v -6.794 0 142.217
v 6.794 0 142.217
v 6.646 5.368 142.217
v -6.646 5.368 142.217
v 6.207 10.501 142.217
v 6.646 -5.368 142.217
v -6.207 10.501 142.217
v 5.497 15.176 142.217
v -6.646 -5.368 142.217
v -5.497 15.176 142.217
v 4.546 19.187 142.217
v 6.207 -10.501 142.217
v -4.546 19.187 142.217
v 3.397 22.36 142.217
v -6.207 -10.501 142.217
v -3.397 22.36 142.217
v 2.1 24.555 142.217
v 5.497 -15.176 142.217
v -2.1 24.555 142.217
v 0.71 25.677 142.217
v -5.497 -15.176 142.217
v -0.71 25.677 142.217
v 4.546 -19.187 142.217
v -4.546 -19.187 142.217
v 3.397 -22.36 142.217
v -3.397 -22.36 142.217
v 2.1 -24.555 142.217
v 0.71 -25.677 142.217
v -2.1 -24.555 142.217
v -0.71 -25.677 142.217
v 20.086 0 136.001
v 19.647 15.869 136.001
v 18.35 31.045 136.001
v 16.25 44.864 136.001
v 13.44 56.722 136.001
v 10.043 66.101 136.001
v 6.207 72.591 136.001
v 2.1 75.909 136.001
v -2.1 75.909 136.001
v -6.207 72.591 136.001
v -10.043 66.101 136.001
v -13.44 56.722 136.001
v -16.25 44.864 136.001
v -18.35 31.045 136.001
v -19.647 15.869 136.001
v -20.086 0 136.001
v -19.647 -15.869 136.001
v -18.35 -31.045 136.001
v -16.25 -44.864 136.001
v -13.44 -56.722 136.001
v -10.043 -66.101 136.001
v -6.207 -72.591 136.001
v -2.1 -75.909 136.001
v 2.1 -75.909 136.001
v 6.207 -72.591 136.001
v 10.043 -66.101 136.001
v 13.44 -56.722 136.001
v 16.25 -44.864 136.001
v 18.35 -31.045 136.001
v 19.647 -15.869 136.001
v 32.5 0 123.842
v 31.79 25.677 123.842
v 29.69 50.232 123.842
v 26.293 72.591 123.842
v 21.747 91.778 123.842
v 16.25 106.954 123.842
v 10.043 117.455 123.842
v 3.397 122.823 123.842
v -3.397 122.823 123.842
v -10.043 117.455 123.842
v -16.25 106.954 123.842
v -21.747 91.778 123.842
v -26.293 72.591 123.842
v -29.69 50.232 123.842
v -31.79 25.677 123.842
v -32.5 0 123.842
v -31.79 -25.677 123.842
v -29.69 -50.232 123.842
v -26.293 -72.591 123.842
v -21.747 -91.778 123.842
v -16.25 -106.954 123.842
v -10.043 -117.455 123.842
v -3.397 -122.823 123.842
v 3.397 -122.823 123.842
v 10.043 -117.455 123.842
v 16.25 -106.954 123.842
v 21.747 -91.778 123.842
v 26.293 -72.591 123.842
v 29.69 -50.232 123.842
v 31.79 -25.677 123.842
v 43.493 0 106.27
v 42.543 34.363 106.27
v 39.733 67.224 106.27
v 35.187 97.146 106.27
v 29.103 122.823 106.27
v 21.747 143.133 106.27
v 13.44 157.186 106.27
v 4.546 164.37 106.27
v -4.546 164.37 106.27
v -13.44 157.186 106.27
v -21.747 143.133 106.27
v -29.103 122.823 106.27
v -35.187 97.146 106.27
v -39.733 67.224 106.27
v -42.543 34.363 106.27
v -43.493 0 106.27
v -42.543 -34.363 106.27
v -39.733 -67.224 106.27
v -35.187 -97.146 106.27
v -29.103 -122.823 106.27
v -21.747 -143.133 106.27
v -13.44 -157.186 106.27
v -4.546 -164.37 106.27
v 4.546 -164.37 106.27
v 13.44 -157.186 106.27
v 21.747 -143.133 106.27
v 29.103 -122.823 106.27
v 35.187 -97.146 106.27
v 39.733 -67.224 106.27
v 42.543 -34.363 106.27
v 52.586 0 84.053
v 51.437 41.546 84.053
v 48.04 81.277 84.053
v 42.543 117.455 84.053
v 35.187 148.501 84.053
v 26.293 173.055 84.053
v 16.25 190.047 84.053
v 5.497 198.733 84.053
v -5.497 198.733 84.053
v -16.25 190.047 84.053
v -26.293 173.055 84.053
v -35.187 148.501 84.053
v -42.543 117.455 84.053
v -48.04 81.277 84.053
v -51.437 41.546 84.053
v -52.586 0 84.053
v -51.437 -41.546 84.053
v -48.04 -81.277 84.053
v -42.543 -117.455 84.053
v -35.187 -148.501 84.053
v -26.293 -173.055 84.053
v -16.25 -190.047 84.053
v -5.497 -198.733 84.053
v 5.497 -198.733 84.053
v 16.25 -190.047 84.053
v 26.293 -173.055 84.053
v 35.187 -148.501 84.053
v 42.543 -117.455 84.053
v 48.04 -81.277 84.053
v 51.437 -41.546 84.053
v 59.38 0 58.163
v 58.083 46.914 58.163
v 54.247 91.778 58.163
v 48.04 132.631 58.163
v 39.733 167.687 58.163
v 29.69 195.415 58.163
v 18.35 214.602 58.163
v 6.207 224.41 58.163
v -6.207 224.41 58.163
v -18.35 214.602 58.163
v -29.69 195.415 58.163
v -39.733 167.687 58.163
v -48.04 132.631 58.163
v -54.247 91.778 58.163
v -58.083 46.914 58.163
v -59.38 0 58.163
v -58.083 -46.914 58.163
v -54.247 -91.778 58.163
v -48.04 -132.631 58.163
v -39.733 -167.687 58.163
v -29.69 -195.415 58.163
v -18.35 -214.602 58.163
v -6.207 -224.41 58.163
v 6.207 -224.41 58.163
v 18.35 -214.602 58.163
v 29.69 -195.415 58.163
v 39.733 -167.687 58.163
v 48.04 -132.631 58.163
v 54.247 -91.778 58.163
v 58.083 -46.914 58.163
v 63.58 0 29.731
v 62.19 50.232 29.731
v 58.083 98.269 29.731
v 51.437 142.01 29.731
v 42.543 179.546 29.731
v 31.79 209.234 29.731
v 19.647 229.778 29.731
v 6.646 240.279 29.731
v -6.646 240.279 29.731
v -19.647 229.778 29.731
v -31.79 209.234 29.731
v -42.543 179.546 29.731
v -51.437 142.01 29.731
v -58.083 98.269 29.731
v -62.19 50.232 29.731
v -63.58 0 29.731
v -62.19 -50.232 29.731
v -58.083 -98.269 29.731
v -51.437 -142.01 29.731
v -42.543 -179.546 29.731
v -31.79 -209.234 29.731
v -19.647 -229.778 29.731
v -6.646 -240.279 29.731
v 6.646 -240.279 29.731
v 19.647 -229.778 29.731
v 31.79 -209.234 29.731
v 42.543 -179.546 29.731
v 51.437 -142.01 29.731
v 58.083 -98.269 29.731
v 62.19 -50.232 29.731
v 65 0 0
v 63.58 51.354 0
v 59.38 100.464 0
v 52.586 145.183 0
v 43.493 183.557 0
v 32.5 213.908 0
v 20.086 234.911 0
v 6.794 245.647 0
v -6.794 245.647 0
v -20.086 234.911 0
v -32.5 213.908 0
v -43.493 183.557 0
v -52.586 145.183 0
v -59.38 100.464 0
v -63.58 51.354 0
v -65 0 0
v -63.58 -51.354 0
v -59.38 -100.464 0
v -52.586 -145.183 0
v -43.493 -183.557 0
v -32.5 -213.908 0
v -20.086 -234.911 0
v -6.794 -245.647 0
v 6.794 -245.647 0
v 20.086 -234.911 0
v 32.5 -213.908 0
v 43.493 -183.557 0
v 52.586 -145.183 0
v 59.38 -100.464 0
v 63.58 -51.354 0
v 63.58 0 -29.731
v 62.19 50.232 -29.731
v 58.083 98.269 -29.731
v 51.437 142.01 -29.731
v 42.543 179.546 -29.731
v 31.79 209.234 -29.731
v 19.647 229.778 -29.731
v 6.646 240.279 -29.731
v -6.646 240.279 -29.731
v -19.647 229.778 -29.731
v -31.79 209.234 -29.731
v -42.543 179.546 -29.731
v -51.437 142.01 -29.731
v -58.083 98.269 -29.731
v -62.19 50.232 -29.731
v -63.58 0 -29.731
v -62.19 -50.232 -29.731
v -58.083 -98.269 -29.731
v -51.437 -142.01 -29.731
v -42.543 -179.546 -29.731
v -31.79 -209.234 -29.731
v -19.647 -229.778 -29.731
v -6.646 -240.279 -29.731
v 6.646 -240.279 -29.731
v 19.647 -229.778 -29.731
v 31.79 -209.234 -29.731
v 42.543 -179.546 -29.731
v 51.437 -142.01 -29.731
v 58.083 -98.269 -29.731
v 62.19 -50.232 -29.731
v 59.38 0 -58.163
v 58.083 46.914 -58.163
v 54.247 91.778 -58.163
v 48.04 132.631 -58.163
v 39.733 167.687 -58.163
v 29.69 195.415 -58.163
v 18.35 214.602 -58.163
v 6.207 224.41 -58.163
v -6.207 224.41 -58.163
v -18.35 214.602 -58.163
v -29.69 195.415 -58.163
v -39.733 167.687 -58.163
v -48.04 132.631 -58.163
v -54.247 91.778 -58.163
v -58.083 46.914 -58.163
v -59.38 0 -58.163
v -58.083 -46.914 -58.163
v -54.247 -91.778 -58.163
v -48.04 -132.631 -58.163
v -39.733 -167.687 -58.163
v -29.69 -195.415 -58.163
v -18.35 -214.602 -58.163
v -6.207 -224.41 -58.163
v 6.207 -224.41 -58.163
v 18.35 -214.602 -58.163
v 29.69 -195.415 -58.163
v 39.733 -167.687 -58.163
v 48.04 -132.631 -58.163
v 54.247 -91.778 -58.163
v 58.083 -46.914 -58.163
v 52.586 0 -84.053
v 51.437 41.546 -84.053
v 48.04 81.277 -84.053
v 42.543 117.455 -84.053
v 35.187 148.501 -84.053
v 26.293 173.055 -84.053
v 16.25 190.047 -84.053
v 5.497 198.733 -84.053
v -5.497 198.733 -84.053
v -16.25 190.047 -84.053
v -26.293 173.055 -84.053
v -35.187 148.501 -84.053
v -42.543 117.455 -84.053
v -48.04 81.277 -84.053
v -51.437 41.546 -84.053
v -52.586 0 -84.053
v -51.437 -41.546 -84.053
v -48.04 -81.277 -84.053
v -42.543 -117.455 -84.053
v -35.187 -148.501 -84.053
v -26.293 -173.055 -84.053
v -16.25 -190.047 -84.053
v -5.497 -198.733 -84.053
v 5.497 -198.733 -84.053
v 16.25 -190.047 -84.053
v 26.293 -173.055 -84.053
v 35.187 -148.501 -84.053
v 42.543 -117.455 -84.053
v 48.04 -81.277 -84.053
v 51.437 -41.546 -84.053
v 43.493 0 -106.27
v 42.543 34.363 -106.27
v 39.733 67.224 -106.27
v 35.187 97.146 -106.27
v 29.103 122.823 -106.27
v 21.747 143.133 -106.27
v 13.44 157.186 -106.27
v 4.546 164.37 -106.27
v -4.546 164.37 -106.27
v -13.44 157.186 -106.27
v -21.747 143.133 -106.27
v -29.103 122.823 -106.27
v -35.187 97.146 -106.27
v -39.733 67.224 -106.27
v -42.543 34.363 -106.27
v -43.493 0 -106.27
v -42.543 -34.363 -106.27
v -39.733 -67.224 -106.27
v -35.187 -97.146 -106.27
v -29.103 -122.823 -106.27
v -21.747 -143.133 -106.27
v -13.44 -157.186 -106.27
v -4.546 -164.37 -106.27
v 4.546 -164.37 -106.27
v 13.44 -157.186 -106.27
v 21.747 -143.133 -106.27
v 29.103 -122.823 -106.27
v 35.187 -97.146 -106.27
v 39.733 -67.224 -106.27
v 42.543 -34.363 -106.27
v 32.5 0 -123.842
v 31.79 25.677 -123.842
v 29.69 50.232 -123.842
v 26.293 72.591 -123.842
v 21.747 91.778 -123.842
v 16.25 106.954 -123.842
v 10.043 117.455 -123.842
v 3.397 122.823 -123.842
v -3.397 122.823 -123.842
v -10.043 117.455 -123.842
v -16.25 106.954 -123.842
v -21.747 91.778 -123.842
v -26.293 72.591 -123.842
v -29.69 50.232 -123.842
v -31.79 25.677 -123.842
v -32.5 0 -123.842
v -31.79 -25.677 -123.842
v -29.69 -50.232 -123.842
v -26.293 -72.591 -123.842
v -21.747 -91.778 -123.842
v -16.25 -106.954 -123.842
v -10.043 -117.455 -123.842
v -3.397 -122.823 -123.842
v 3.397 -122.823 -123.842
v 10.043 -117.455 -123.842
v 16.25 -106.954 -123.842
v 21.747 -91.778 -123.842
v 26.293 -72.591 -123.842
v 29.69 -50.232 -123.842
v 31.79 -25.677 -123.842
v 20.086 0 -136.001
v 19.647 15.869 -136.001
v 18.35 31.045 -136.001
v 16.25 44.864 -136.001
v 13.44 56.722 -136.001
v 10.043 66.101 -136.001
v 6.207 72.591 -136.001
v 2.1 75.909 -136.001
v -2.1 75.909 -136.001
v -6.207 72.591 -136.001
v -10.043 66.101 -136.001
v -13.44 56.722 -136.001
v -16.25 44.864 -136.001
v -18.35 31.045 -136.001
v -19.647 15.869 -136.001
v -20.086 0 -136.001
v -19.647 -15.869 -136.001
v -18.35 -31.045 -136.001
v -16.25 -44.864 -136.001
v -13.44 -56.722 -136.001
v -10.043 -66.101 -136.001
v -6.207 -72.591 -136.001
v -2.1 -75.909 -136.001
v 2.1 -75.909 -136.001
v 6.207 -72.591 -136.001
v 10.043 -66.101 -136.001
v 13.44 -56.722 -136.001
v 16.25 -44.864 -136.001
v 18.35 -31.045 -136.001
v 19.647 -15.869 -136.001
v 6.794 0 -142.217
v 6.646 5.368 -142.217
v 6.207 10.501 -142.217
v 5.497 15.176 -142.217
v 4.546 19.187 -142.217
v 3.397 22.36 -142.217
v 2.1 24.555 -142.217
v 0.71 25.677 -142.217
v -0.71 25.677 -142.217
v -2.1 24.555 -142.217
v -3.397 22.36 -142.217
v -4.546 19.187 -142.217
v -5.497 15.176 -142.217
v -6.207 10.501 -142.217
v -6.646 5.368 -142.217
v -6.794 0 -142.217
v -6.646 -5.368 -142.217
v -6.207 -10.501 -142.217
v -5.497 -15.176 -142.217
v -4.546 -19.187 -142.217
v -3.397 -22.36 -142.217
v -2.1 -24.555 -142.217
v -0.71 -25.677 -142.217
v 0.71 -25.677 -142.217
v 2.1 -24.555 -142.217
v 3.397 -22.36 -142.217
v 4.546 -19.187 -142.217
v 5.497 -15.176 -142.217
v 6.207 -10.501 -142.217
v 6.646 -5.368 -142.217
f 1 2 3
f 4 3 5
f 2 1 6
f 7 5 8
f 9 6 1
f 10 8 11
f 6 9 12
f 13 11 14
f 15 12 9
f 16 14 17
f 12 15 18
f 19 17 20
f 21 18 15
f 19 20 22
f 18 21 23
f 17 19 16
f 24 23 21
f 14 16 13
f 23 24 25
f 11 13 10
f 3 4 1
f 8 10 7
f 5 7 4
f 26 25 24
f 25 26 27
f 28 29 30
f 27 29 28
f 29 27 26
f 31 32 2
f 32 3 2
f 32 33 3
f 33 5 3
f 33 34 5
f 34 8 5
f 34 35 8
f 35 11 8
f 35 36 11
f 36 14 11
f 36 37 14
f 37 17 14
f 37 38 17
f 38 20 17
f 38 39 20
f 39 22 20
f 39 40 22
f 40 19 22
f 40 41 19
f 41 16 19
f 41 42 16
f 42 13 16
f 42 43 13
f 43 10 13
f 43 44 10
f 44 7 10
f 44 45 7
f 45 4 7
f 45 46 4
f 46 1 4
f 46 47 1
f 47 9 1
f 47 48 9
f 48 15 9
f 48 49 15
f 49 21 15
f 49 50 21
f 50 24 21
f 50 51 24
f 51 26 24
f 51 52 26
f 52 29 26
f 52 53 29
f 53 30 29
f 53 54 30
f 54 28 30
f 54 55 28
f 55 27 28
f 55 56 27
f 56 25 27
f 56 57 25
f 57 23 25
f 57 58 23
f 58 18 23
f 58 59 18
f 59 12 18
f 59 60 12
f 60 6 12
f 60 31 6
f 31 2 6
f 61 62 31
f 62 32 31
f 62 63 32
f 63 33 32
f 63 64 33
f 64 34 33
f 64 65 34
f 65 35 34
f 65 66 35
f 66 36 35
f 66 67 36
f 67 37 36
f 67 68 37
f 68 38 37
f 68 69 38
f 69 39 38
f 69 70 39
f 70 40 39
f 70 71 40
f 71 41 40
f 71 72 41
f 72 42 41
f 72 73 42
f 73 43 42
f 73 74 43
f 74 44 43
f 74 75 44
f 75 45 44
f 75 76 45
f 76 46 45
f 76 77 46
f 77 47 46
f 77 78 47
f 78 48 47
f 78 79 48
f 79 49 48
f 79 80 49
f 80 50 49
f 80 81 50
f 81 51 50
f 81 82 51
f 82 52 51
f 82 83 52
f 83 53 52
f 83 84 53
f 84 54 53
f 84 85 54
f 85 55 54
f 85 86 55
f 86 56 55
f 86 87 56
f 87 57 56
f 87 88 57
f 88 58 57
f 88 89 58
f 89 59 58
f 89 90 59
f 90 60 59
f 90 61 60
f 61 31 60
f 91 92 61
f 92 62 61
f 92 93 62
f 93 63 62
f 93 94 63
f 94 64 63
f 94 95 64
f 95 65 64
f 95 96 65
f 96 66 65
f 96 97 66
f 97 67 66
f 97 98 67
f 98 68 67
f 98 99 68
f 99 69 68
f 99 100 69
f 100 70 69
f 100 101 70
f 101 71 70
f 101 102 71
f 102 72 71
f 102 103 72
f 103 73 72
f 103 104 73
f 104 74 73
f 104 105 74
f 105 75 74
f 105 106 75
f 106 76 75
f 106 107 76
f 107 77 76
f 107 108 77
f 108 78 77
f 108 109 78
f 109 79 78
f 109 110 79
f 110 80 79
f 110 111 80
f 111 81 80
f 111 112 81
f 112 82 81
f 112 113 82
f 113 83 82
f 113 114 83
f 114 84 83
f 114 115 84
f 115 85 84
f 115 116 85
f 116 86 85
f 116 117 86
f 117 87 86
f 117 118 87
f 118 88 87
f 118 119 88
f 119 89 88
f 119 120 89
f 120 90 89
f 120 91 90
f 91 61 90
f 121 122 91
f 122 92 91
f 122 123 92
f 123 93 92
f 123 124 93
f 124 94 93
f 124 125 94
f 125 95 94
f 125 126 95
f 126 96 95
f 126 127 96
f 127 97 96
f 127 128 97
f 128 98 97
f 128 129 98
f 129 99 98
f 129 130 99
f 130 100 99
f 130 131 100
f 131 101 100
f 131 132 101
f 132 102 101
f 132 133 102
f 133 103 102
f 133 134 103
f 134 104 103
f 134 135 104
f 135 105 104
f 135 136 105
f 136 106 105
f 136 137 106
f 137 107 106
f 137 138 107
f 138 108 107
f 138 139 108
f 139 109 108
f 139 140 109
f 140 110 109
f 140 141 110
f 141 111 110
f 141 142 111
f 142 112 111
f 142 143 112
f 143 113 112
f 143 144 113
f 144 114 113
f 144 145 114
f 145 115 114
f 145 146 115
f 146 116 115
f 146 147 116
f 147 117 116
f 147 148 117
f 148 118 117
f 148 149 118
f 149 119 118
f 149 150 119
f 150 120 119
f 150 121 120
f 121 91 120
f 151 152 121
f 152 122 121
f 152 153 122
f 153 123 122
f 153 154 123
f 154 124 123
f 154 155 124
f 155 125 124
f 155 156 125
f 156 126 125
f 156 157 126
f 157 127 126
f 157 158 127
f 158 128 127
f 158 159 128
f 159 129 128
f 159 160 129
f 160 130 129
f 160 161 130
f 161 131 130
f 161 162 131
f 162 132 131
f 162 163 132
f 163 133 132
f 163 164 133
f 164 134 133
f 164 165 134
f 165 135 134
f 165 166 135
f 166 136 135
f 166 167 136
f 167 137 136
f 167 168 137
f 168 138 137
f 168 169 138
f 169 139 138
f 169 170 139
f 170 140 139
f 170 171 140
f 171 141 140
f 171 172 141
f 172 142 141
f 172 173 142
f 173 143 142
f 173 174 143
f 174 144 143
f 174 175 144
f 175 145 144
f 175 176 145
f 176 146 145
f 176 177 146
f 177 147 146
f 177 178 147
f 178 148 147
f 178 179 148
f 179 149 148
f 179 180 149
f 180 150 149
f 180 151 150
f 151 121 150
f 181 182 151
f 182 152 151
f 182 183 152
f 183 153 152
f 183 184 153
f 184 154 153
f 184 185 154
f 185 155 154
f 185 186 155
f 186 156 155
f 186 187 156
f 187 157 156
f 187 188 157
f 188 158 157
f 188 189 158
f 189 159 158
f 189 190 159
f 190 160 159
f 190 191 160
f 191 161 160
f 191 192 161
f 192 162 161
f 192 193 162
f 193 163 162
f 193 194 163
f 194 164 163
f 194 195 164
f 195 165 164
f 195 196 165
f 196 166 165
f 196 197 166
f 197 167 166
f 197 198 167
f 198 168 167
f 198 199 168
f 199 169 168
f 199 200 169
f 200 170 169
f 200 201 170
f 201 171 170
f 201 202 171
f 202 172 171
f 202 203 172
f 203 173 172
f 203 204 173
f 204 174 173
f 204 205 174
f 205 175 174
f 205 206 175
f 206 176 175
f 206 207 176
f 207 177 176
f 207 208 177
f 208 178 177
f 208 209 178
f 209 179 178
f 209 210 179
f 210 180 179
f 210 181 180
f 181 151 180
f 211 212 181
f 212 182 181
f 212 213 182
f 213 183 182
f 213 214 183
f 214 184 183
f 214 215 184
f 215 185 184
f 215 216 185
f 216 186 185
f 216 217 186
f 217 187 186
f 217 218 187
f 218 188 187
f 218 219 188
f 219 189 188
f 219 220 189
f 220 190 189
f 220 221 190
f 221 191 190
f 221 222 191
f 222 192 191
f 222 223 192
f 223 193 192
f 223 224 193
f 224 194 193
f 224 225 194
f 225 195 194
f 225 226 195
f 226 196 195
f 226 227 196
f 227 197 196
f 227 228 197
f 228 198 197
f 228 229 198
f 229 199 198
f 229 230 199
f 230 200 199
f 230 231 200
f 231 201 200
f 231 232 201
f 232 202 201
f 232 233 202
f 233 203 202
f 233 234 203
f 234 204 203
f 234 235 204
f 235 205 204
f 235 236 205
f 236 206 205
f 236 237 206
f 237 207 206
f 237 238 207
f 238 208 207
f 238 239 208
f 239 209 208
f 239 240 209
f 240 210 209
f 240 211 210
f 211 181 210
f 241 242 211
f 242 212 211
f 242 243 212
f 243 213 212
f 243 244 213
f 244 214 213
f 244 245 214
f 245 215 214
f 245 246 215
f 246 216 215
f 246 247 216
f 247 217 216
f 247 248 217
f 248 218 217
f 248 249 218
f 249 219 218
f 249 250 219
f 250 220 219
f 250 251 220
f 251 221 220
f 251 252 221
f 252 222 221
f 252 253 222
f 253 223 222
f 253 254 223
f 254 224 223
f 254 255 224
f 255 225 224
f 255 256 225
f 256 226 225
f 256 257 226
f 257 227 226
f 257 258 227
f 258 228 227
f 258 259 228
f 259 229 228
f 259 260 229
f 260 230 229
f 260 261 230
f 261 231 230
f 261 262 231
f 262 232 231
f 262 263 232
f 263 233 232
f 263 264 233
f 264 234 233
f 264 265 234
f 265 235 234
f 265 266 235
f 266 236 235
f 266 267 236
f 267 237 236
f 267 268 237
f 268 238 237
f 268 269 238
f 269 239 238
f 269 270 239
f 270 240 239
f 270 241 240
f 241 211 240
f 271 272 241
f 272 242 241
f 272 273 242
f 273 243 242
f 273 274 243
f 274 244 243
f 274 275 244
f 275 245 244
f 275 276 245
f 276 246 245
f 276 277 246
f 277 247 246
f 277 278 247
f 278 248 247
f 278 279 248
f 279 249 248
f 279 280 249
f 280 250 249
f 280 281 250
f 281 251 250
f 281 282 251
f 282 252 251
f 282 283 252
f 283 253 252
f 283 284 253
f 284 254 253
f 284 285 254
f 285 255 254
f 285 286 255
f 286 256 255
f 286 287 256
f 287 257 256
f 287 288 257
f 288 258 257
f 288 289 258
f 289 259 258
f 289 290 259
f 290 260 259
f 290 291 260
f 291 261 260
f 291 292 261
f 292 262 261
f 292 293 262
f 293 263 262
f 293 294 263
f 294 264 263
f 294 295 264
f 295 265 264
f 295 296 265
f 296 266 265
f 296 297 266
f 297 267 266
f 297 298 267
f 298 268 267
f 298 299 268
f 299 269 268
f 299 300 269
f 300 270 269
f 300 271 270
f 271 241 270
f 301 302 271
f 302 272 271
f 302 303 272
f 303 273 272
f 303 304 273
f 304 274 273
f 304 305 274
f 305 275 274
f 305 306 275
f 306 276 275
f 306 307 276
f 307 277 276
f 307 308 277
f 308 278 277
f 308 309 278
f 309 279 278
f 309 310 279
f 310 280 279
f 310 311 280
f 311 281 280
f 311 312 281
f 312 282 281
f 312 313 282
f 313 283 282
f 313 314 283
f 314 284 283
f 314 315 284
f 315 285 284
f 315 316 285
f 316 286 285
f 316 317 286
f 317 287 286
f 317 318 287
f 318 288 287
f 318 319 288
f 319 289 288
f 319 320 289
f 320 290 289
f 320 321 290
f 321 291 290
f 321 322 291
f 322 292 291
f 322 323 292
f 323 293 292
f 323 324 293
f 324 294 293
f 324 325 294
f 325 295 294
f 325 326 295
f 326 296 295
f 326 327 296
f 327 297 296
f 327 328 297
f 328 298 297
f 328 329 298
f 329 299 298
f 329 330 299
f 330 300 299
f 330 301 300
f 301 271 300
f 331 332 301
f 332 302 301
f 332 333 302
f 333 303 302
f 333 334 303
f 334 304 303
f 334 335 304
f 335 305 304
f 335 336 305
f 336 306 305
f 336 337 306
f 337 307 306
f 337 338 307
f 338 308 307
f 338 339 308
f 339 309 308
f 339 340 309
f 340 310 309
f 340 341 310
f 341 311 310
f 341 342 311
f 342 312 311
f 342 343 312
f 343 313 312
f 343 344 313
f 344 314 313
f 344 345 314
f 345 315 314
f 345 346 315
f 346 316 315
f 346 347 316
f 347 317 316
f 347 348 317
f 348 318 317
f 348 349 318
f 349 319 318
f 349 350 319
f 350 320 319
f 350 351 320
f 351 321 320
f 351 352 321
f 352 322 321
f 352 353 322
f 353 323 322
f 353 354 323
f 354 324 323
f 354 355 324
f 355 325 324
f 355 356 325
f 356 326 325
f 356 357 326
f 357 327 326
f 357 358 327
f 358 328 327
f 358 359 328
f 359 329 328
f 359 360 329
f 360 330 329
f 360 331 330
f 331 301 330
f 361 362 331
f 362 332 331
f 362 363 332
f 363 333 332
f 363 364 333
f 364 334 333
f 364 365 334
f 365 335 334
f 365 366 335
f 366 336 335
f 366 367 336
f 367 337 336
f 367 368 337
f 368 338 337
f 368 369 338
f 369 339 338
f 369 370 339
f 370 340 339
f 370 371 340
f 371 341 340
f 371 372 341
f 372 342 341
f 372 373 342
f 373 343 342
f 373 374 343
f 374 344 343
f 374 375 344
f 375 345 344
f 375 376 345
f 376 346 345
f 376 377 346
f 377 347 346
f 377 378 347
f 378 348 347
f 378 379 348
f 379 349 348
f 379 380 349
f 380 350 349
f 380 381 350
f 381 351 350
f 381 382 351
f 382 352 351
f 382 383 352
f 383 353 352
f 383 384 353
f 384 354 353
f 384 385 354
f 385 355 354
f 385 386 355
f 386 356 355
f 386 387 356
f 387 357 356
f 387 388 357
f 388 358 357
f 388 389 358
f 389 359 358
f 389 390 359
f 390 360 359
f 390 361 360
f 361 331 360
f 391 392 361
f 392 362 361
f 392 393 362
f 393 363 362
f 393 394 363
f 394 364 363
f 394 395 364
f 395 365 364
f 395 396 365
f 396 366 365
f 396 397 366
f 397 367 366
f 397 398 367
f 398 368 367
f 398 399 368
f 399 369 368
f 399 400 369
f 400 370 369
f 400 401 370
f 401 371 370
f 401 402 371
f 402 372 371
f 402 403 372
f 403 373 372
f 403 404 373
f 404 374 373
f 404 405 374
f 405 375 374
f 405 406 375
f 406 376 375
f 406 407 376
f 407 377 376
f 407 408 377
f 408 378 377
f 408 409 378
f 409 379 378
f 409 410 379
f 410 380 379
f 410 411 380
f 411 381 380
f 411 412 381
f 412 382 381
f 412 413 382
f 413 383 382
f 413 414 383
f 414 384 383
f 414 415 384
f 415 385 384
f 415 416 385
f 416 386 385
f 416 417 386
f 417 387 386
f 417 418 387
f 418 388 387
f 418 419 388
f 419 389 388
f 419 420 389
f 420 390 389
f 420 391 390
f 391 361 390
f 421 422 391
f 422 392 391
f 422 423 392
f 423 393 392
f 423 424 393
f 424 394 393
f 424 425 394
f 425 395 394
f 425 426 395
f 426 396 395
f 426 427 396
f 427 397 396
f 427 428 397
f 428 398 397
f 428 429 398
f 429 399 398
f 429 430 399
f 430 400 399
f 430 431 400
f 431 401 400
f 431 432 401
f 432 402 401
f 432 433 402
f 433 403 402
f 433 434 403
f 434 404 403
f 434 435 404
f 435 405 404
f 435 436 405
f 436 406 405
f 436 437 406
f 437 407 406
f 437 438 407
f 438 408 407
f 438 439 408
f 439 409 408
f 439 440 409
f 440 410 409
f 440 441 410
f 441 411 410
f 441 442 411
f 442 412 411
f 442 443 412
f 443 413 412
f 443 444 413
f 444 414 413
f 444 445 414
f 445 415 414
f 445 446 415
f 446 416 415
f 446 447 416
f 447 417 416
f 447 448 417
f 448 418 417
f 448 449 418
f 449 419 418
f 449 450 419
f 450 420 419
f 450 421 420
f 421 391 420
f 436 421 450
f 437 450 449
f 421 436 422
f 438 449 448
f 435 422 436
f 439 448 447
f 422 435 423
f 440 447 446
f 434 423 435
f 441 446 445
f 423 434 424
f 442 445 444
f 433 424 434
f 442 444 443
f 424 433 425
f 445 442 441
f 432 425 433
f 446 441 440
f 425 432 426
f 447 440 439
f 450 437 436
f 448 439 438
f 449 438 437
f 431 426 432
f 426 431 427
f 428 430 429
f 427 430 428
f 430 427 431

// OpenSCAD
// Generated by SolidPython 1.0.1 on 2020-07-29 00:46:47


scale(v = [5, 19, 11]) {
	sphere(r = 13);
}
/***********************************************
*********      SolidPython code:      **********
************************************************
 
# import packages: SolidPython
from solid import *
from solid.utils import *
from itertools import chain, combinations, permutations


class Resize:

    def __init__(self, scad_file):
        self.scad_file = scad_file
        #self.scad_file = import_scad(scad_file)
        # cone/cylinder param:
        self.r1 = 0
        self.r2 = 0
        self.h = 0
        # rectangular prism param:
        self.w = 0
        self.l = 0
        # ellipse param:
        self.r = 0

    # import OpenScad code (file name corresponds to shape)


    # classify shape + parameters
    def assign(self, param1, param2, param3):
        if self.scad_file == 'cone.scad':
            self.r1 = param1
            self.r2 = param2
            self.h = param3
        elif self.scad_file == 'cylinder.scad':
            self.r1 = param1
            self.r2 = param2
            self.h = param3
        elif self.scad_file == 'rectangularPrism.scad':
            self.h = param1
            self.l = param2
            self.w = param3
        else:
            self.r = param1
            self.h = param2

    # resize parameters
    def iterate(self):
        x = range(3, 20, 2)
        i = 1
        if self.scad_file == 'cone.scad':
            tempList = list(permutations(x, 2))
            for temp in tempList:
                param1 = temp[0]
                param2 = temp[1]
                filepath = 'produced_scad_files/' + 'cone' + str(param1) + '_' + str(param2) + '_' + '.scad'
                scad_render_to_file(cylinder(h=param1, r1=param2, r2=0), filepath)

        elif self.scad_file == 'cylinder.scad':
            tempList = list(permutations(x, 3))
            for temp in tempList:
                param1 = temp[0]
                param2 = temp[1]
                filepath = 'produced_scad_files/' + 'cylinder' + str(param1) + '_' + str(param2) + '_' + '.scad'
                scad_render_to_file(cylinder(h=param1, r1=param2, r2=param2), filepath)

        elif self.scad_file == 'rectangularPrism.scad':
            tempList = list(permutations(x, 3))
            for temp in tempList:
                param1 = temp[0]
                param2 = temp[1]
                param3 = temp[2]
                filepath = 'produced_scad_files/' + 'rectangularPrism' + str(param1) + '_' + str(param2) + '_' + str(
                    param3) + '.scad'
                scad_render_to_file(cube(size=(param1, param2, param3)), filepath)

        elif self.scad_file == 'ellipse.scad':
            tempList = list(permutations(x, 4))
            for temp in tempList:
                param1 = temp[0]
                param2 = temp[1]
                param3 = temp[2]
                param4 = temp[3]
                filepath = 'produced_scad_files/' + 'ellipse' + str(param1) + '_' + str(param2) + '_' + str(param3) + '_' + str(param4) + '.scad'
                scad_render_to_file(scale([param1, param2, param3])(sphere(r=param4)), filepath)

    def render_to_scadfile(self):
        scad_render_to_file(scad, 'example.scad') 
 
************************************************/
